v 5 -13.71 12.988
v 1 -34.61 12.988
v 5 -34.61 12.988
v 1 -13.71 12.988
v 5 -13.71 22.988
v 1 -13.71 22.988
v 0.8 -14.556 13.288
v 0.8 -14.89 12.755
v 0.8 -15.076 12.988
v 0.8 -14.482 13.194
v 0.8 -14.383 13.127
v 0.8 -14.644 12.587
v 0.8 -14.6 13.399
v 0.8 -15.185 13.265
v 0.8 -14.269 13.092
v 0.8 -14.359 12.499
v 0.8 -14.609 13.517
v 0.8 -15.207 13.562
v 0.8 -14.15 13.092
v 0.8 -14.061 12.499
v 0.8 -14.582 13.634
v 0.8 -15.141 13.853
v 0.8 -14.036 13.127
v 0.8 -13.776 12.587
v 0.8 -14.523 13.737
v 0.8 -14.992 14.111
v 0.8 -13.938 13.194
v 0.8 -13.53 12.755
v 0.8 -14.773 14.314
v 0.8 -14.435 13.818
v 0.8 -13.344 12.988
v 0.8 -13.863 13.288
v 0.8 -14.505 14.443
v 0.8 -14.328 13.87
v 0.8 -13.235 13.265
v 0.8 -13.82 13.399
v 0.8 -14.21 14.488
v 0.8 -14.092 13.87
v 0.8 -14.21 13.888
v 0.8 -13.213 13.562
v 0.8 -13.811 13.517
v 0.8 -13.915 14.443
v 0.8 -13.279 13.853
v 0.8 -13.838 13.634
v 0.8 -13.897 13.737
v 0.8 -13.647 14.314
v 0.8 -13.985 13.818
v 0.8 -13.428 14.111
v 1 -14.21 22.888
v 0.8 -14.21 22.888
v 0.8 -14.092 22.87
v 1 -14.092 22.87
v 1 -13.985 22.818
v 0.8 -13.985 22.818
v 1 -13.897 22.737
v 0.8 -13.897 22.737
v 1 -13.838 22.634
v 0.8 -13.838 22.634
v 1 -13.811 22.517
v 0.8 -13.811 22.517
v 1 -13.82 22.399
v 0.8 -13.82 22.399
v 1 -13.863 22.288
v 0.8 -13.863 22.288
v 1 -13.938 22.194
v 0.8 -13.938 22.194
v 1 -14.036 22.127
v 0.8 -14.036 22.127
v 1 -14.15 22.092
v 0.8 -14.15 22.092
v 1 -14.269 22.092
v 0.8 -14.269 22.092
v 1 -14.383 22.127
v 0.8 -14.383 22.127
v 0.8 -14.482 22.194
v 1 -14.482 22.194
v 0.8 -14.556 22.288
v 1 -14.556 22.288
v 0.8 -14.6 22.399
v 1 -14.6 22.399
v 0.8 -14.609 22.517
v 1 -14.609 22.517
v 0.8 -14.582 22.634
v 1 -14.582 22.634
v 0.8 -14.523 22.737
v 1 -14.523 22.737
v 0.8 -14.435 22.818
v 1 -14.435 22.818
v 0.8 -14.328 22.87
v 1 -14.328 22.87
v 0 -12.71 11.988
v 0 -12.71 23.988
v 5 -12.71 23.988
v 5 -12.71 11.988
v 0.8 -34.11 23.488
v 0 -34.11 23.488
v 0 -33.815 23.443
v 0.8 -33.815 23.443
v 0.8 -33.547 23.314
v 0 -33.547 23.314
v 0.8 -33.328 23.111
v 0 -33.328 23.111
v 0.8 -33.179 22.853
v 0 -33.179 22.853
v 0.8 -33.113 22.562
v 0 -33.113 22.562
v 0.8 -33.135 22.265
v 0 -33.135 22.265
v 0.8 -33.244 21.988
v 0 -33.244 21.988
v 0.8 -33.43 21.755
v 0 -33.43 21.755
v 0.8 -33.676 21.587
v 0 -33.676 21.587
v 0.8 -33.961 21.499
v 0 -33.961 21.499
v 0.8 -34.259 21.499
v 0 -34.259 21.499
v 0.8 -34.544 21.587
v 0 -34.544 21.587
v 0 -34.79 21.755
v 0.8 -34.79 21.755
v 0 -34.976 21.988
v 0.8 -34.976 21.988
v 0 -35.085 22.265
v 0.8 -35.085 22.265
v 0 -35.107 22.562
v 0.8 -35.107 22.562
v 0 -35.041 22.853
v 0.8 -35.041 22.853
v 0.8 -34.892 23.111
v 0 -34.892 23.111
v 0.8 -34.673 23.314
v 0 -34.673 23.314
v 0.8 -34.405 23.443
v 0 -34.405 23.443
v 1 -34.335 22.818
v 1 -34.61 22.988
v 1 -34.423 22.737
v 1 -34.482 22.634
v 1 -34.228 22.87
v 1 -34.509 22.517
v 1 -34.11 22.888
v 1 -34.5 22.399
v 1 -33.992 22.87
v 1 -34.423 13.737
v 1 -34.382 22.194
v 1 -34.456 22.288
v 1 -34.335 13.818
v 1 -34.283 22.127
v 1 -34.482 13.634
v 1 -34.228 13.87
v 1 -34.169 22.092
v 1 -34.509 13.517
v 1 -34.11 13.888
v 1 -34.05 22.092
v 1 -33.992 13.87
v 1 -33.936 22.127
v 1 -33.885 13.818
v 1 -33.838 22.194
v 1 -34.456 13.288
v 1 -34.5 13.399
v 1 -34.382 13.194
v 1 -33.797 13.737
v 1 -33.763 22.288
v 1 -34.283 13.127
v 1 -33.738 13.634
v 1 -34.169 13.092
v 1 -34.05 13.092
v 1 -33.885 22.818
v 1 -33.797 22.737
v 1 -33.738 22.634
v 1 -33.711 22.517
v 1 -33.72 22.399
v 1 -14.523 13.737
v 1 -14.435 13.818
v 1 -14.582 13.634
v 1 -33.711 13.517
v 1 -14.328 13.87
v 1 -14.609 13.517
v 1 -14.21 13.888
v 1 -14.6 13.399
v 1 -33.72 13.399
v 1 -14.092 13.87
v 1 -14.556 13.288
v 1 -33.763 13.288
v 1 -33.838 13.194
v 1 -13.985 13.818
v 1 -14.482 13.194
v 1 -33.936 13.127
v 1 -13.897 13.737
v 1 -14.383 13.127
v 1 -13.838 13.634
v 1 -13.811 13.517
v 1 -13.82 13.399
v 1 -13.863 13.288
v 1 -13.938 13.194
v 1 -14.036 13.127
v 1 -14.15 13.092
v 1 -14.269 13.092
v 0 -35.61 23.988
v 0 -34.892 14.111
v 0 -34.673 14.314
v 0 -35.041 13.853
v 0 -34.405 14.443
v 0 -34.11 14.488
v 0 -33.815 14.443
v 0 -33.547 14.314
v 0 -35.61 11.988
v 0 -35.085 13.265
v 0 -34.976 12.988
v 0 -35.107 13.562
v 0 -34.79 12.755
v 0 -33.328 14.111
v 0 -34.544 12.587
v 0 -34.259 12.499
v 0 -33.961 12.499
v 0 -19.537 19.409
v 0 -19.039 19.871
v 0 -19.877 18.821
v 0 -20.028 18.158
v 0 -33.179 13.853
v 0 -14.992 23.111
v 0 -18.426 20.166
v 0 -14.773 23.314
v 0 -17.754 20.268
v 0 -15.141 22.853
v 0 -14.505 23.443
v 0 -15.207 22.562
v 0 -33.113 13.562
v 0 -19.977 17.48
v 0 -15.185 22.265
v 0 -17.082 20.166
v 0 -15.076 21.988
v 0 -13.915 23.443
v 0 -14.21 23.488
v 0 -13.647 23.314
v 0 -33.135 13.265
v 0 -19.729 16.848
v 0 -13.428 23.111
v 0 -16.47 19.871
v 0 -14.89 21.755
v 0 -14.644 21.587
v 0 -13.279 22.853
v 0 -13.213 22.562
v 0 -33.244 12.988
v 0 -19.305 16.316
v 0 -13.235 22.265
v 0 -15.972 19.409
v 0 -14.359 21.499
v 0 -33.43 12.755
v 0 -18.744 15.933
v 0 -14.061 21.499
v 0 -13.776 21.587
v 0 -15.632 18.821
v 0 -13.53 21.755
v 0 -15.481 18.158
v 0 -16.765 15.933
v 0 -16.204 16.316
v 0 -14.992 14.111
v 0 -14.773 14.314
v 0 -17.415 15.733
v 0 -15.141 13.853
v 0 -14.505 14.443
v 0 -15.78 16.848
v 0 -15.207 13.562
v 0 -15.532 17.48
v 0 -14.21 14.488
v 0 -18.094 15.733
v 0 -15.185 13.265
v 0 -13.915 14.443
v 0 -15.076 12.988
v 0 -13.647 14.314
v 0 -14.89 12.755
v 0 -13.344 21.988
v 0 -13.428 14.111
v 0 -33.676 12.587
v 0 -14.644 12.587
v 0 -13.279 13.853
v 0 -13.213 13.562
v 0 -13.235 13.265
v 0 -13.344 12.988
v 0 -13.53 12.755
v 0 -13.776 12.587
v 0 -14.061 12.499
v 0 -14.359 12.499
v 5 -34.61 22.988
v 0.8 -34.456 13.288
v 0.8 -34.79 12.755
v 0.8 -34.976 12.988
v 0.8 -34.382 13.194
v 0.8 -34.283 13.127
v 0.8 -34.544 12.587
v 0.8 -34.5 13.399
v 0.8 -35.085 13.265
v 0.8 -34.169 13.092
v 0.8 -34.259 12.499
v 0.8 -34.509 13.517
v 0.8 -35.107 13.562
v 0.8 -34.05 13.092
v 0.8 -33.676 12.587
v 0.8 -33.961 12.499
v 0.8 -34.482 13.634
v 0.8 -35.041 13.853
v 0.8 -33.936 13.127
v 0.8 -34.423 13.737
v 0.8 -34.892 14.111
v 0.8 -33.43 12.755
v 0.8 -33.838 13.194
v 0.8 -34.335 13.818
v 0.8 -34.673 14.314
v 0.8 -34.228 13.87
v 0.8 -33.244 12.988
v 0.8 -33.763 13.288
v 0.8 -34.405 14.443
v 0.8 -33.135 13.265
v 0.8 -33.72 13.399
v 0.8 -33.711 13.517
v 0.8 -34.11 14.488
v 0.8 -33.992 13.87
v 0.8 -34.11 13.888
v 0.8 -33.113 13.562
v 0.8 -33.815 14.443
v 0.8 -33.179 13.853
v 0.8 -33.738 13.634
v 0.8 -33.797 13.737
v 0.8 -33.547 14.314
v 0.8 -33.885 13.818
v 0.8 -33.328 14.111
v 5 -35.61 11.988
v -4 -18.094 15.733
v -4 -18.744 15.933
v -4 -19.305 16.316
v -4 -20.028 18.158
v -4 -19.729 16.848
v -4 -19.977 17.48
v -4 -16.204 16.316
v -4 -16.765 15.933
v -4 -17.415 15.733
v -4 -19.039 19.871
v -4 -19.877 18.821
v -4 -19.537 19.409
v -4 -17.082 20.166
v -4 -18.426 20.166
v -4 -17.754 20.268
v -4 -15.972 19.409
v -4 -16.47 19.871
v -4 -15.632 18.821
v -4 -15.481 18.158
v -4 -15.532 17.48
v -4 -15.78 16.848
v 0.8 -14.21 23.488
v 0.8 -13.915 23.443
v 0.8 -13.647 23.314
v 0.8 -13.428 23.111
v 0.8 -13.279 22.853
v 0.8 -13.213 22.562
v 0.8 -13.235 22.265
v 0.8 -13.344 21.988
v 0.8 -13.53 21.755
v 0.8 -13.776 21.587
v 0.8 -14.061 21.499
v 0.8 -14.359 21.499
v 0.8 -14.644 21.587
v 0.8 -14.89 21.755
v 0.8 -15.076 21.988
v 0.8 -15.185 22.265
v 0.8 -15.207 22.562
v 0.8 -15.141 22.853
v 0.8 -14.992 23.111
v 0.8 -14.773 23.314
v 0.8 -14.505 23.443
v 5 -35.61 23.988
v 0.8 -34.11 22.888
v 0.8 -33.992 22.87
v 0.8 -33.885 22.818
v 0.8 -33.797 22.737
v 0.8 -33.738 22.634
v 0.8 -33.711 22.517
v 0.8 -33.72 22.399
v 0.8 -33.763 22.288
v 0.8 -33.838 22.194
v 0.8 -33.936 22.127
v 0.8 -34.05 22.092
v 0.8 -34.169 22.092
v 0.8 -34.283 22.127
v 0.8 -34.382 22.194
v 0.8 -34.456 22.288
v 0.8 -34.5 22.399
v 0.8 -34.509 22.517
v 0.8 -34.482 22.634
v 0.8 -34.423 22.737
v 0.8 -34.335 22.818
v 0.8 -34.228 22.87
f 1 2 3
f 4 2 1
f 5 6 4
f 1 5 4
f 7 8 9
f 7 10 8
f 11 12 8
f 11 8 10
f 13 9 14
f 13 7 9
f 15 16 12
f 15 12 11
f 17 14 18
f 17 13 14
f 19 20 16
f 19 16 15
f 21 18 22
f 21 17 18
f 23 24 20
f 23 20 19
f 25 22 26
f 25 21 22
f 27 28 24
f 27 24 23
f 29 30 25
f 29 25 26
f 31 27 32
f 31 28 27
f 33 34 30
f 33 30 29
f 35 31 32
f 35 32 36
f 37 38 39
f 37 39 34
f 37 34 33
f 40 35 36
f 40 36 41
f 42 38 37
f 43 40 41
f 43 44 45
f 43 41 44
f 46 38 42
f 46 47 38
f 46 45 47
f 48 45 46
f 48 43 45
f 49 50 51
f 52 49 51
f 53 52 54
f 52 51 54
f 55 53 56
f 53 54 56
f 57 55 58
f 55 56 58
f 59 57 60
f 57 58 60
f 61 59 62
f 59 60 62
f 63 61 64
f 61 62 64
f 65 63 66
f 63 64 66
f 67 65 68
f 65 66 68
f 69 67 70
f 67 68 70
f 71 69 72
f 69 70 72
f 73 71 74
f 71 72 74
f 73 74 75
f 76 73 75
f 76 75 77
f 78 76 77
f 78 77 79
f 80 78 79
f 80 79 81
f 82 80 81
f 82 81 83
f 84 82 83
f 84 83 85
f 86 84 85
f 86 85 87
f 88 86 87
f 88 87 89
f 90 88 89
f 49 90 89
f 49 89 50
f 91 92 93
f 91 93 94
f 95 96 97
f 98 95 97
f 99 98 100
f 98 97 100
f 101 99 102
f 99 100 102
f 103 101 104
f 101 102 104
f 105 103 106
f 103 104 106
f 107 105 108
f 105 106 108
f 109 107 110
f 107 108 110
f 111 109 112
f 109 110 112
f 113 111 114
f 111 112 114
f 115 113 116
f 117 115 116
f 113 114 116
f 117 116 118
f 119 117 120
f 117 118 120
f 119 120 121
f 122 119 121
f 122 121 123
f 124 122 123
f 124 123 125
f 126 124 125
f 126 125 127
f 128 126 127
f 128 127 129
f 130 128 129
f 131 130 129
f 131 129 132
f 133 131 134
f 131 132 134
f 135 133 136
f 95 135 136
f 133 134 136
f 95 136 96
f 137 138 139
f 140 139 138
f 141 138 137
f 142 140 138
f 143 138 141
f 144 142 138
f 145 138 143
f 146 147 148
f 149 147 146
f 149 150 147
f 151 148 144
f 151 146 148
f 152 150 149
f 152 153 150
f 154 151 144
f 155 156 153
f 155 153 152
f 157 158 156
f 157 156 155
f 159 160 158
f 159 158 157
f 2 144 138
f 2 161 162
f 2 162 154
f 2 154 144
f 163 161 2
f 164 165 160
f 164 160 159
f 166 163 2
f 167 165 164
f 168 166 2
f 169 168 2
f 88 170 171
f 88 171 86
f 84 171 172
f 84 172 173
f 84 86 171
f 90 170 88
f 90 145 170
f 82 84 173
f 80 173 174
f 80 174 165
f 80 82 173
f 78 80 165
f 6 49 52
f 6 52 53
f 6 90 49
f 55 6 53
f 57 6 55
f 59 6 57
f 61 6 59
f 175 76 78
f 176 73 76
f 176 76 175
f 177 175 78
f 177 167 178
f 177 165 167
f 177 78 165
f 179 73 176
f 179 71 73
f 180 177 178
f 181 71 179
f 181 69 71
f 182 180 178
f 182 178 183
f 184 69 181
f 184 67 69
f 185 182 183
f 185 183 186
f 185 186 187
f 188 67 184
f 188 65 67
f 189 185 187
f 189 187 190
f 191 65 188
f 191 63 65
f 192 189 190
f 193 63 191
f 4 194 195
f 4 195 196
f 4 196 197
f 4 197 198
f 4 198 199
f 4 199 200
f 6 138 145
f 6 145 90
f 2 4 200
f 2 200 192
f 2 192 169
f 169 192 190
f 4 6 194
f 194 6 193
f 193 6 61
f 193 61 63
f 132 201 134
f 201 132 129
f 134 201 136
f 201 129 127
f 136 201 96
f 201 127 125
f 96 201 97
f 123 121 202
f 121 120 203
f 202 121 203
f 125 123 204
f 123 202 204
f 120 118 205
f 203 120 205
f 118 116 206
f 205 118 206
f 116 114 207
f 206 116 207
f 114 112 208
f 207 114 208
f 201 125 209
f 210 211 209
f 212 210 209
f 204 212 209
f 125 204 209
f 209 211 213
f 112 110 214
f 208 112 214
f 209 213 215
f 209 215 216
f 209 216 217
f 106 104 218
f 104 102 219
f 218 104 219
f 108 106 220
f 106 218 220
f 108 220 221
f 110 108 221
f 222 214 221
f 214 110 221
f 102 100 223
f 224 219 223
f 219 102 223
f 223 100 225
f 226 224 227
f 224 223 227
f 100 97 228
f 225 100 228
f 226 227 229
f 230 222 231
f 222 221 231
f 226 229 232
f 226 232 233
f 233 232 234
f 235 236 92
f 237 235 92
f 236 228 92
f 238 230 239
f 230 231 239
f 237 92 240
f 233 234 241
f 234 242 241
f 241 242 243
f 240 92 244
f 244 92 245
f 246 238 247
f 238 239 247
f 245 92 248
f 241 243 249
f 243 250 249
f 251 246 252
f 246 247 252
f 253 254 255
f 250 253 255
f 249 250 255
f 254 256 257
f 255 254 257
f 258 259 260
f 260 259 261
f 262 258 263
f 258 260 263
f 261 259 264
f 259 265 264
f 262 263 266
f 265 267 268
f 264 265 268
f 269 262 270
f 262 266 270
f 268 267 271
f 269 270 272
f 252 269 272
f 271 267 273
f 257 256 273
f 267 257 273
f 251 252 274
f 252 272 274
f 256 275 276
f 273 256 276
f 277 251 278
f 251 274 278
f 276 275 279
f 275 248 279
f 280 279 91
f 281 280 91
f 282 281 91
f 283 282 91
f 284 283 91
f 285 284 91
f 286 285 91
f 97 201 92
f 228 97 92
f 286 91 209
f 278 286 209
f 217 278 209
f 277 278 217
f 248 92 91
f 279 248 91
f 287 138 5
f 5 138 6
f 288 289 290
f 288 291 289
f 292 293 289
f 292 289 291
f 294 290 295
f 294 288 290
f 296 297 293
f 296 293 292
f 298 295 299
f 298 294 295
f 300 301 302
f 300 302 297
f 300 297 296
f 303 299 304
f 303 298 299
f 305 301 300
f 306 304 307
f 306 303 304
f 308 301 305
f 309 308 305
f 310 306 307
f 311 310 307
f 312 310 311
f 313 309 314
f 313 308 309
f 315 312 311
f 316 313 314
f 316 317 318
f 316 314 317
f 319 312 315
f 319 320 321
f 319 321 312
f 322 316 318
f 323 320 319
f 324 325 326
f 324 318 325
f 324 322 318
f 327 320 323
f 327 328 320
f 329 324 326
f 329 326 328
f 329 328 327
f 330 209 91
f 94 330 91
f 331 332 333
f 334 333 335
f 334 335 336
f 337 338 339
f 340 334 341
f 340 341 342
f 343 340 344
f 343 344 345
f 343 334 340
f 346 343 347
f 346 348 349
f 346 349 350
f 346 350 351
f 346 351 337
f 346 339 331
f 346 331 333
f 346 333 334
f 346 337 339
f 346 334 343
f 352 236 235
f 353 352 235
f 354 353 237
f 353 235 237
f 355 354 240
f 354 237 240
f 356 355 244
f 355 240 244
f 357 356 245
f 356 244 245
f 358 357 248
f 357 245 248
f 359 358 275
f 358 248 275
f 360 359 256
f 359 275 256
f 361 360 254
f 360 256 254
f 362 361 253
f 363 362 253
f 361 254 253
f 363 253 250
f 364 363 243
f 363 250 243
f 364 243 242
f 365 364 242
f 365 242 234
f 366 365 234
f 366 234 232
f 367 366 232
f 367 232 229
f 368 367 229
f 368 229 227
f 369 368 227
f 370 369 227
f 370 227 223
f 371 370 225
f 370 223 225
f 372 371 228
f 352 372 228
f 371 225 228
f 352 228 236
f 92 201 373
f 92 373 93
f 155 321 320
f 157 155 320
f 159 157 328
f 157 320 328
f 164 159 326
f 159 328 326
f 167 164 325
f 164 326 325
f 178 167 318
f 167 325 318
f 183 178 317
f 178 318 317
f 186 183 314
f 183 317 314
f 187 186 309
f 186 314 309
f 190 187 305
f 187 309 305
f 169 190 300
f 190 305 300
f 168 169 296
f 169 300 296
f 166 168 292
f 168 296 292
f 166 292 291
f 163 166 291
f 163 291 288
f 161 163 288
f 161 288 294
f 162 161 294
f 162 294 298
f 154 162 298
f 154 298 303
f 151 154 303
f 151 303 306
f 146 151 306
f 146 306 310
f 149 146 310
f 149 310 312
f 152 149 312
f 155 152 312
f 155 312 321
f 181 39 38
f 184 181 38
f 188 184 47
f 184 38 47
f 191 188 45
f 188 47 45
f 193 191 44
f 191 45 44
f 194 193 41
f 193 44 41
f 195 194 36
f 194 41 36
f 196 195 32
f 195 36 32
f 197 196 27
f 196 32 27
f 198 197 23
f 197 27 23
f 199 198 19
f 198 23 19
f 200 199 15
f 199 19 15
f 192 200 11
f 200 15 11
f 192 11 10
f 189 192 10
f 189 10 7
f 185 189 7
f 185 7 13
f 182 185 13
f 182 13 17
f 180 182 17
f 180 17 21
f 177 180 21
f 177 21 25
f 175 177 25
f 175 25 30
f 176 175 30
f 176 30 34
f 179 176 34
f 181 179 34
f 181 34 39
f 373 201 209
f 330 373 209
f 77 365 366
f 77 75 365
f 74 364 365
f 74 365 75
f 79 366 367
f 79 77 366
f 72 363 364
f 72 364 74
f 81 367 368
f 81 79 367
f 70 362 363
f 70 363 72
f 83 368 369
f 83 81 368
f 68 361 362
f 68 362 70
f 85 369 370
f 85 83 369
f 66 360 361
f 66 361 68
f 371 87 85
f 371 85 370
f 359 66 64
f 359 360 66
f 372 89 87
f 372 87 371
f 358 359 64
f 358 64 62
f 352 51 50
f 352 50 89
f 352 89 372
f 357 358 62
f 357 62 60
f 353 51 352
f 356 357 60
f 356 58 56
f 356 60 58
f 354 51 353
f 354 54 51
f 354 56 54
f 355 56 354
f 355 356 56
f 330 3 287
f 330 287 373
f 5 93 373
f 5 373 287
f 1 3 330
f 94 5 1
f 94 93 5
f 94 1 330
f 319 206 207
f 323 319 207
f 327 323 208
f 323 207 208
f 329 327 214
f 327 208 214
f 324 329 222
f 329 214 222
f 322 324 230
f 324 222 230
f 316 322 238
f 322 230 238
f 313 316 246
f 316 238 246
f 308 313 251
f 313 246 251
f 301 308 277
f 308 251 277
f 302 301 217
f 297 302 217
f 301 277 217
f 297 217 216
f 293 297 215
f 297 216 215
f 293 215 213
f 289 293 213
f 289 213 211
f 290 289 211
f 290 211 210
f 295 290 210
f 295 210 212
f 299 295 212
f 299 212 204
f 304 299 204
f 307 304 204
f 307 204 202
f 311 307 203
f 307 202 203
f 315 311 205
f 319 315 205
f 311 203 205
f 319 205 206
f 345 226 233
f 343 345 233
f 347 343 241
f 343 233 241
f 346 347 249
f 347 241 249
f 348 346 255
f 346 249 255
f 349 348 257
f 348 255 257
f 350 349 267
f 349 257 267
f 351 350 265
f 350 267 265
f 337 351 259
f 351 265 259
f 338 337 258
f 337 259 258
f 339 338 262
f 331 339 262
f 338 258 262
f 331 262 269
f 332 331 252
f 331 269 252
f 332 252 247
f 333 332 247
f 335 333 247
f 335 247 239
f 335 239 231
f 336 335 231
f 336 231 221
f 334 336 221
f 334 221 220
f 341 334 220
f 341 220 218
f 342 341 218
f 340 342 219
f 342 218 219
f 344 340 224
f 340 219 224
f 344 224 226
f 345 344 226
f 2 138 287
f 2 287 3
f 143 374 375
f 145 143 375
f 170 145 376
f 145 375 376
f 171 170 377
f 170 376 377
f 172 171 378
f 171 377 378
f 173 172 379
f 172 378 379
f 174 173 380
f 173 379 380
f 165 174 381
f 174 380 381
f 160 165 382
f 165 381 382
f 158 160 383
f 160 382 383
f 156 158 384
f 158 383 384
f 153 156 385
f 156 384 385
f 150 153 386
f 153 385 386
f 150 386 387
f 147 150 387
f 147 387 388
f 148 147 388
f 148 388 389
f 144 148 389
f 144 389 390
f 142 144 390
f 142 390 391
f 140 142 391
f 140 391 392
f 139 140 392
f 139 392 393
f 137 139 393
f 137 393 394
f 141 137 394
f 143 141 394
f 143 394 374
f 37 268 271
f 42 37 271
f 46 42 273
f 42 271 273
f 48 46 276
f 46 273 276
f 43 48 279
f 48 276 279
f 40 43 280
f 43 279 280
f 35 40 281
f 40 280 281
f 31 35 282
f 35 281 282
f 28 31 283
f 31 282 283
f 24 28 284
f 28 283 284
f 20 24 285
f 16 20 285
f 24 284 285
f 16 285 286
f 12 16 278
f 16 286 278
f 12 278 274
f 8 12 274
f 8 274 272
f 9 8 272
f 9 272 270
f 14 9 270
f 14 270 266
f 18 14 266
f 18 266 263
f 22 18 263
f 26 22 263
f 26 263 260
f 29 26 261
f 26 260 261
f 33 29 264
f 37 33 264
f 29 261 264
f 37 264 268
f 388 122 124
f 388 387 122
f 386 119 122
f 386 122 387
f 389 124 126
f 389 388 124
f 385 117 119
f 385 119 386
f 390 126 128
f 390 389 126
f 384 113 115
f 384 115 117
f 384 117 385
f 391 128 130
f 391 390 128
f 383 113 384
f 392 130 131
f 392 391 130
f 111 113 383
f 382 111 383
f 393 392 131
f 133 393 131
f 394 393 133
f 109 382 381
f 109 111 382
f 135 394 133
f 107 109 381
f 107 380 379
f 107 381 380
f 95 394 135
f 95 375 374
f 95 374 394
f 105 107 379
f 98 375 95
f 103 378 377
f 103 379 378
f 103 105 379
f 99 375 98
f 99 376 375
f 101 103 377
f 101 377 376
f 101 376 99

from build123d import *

# Parameters (mm, degrees)
CROQUIS1_W              = 12
CROQUIS1_H              = 22.9
SALIENTE_EXTRUIR1_DEPTH = 5
VACIADO2_T              = -1
CROQUIS2_R              = 2.28
SALIENTE_EXTRUIR2_DEPTH = 4
CROQUIS4_R              = 1
CORTAR_EXTRUIR1_DEPTH   = 0.8
CROQUIS5_R              = 0.4
CORTAR_EXTRUIR2_DEPTH   = 0.8


with BuildPart() as part:
    # Croquis1 → Saliente-Extruir1 (new body)
    with BuildSketch(Plane(origin=(0, 0, 0), x_dir=(0, 0, -1), z_dir=(1, 0, 0))):
        with Locations((-17.987585454, -24.1598532)):
            Rectangle(CROQUIS1_W, CROQUIS1_H)
    extrude(amount=SALIENTE_EXTRUIR1_DEPTH)

    # Vaciado2
    vaciado2_openings = [part.faces().sort_by_distance(p)[0] for p in [
        (5, -24.1598532, 17.987585454),
    ]]
    offset(amount=VACIADO2_T, openings=vaciado2_openings, kind=Kind.INTERSECTION)

    # Croquis2 → Saliente-Extruir2 (add)
    with BuildSketch(Plane.ZY):
        with Locations((17.987585454, -17.75436054)):
            Circle(CROQUIS2_R)
    extrude(amount=SALIENTE_EXTRUIR2_DEPTH)

    # Croquis4 → Cortar-Extruir1 (cut)
    with BuildSketch(Plane.ZY):
        with Locations((13.487585454, -14.2098532)):
            Circle(CROQUIS4_R)
        with Locations((22.487585454, -14.2098532)):
            Circle(CROQUIS4_R)
        with Locations((13.487585454, -34.1098532)):
            Circle(CROQUIS4_R)
        with Locations((22.487585454, -34.1098532)):
            Circle(CROQUIS4_R)
    extrude(amount=-CORTAR_EXTRUIR1_DEPTH, mode=Mode.SUBTRACT)

    # Croquis5 → Cortar-Extruir2 (cut)
    with BuildSketch(Plane.ZY.offset(-0.8)):
        with Locations((13.487585454, -14.2098532)):
            Circle(CROQUIS5_R)
        with Locations((22.487585454, -14.2098532)):
            Circle(CROQUIS5_R)
        with Locations((13.487585454, -34.1098532)):
            Circle(CROQUIS5_R)
        with Locations((22.487585454, -34.1098532)):
            Circle(CROQUIS5_R)
    extrude(amount=-CORTAR_EXTRUIR2_DEPTH, mode=Mode.SUBTRACT)


solid = part.part
